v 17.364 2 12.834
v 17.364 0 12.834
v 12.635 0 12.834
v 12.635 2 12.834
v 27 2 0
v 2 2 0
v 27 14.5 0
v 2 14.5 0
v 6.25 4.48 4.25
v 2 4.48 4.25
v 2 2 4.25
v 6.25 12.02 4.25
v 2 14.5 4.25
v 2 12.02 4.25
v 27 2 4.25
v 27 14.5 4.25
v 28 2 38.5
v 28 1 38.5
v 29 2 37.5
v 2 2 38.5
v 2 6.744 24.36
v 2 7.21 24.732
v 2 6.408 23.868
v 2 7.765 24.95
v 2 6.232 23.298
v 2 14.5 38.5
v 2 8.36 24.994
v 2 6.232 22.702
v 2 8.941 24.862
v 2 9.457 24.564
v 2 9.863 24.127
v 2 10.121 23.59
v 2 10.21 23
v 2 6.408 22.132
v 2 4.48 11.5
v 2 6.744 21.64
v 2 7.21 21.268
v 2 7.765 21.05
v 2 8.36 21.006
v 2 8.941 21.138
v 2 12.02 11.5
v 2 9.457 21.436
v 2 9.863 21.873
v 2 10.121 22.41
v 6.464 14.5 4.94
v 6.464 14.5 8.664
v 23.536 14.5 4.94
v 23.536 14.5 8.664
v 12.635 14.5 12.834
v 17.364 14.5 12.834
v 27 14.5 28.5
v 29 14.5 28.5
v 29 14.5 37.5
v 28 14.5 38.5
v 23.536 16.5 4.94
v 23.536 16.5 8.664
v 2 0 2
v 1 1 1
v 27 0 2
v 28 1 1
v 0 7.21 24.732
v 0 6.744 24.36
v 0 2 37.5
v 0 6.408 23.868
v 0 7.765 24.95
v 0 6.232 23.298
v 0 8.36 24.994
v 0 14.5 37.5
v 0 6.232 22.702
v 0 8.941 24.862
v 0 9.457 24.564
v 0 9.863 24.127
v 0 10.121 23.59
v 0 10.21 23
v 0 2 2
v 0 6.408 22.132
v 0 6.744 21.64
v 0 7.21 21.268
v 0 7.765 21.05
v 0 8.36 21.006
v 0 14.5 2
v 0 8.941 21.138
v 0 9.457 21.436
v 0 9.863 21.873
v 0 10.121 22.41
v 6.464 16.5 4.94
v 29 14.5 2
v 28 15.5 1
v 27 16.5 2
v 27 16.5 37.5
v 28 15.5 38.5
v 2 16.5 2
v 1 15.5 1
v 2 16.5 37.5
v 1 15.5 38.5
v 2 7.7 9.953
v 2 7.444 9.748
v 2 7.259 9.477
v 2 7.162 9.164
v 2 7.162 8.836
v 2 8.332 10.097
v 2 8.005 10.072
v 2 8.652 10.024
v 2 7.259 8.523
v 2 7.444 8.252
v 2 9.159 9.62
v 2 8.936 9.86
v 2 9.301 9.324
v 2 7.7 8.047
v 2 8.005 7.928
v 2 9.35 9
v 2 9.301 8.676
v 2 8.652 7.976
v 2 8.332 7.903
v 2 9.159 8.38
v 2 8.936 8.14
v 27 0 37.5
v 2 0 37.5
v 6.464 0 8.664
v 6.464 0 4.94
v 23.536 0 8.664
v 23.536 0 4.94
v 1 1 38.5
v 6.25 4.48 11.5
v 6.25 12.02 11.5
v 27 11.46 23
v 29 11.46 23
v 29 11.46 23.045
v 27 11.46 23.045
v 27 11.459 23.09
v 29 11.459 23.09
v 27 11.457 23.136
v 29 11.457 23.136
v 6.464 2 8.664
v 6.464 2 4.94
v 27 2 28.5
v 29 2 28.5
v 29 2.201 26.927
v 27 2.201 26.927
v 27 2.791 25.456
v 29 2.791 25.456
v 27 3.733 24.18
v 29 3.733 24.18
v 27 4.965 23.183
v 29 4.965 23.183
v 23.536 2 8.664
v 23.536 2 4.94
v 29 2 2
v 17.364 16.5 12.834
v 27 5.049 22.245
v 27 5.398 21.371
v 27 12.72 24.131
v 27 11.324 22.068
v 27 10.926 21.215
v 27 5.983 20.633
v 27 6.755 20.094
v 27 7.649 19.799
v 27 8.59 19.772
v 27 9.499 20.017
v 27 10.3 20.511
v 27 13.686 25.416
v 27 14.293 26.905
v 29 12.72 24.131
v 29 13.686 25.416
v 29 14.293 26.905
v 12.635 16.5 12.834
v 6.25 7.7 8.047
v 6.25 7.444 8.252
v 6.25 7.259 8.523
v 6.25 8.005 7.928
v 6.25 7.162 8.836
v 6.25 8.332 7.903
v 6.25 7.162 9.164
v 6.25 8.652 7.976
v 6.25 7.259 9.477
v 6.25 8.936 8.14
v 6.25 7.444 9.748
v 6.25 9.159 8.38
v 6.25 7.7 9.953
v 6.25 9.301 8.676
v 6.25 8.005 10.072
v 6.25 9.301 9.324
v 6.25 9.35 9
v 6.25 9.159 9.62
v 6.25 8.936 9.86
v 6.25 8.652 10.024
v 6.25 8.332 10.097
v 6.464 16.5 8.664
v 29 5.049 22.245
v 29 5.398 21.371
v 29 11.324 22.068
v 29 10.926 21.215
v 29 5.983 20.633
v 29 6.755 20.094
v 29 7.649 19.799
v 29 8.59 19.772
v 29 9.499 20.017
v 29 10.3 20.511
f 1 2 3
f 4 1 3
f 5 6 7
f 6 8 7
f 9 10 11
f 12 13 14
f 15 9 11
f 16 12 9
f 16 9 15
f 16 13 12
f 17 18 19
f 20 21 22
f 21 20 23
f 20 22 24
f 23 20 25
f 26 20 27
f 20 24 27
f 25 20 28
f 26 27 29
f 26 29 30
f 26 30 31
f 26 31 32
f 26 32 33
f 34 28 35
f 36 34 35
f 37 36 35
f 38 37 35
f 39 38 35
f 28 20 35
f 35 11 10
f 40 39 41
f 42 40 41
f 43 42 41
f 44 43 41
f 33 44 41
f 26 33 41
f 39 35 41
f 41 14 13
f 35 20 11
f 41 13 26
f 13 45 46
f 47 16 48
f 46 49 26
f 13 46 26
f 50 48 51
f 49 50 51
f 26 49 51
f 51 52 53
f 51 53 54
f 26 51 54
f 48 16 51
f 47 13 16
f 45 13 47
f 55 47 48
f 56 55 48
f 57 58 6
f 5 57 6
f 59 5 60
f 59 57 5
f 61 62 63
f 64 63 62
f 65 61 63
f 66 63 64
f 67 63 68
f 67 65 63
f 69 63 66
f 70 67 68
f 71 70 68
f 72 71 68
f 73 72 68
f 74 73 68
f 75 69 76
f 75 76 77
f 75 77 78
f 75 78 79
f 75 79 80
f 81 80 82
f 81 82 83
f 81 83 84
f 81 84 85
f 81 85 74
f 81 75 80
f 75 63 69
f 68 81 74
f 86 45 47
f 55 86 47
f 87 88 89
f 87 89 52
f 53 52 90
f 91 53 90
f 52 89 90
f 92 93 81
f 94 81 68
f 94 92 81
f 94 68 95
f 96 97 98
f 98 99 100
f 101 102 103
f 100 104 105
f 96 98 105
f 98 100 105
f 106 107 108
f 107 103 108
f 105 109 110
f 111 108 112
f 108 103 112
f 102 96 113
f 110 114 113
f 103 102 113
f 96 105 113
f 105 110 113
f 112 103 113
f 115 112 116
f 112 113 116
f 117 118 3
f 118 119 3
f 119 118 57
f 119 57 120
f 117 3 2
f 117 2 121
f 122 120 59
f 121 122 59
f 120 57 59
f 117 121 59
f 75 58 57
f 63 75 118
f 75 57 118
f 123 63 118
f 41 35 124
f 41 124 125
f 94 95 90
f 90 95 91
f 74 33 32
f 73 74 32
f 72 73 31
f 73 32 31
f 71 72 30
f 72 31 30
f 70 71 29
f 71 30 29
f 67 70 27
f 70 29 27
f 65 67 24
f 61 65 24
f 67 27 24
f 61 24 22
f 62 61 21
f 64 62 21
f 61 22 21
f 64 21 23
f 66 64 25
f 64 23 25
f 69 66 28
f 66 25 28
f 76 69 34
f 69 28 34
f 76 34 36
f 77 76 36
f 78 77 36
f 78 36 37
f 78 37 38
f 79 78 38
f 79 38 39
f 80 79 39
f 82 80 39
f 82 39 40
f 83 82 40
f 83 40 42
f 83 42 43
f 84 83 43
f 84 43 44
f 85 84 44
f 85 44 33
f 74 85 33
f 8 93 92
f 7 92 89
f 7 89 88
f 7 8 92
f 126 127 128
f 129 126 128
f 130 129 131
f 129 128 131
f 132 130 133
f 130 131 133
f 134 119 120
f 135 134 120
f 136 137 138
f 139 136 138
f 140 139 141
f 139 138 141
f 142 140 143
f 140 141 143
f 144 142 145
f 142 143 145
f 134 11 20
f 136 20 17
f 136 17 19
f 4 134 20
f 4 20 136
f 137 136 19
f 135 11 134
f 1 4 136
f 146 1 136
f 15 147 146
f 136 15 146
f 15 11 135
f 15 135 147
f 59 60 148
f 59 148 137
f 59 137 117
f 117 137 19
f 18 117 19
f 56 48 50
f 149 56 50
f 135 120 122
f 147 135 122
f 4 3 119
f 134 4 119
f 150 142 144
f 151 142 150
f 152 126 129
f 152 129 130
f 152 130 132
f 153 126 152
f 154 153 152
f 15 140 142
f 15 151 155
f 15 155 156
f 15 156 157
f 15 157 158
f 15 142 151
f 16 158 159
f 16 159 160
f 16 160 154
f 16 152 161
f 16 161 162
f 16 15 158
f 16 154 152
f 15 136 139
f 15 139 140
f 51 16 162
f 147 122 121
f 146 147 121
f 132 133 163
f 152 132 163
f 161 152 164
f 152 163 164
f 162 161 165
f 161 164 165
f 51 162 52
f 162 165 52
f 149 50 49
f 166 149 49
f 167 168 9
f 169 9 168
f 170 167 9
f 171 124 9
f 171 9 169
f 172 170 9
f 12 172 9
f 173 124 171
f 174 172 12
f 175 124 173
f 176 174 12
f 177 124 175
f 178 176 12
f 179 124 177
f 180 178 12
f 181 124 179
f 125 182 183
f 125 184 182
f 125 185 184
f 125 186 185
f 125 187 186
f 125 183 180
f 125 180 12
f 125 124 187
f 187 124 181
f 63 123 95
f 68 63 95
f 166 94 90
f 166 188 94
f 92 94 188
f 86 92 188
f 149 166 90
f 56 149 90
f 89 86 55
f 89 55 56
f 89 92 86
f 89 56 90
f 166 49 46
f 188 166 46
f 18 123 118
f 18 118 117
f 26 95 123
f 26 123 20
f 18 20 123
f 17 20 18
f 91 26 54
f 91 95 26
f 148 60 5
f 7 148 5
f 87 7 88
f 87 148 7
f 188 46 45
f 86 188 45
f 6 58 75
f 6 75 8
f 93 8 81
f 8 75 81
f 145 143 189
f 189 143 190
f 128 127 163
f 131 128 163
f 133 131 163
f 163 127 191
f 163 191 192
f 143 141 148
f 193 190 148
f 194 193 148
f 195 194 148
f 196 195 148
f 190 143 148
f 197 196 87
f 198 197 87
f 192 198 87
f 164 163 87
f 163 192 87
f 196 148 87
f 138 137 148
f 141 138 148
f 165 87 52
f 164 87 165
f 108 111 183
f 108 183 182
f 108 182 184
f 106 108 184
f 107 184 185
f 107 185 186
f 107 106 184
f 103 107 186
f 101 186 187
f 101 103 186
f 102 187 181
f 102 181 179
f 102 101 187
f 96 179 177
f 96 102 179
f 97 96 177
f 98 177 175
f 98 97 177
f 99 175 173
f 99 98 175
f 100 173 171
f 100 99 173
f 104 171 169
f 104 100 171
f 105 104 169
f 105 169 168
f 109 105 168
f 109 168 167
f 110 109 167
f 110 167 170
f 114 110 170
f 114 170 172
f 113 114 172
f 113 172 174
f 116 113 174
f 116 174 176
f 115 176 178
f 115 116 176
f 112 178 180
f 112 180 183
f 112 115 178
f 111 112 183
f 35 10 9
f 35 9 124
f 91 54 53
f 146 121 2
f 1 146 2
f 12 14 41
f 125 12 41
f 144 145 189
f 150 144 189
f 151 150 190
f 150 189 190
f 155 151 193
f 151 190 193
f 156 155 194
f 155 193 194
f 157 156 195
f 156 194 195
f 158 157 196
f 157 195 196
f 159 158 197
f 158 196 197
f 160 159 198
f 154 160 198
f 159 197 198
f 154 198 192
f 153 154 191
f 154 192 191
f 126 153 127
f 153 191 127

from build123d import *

# Parameters (mm, degrees)
F0_W      = 29
F0_H      = 16.5
F1_DEPTH  = 38.5
F2_T      = -2
F3_DEPTH  = 2.25
F4_SIZE   = 2
F5_SIZE   = 2
F6_SIZE   = 0.99999
F8_DEPTH  = 16.501
F10_DEPTH = 2
F11_R     = 2
F12_DEPTH = 2.001
F13_W     = 7.54
F13_H     = 7.25
F13_R     = 1.1
F14_DEPTH = 4.25


# Not quite as in the source:
# - a fillet or chamfer is up to 0.001 mm smaller than in the source, because OpenCascade refuses the exact size


with BuildPart() as f1:
    # F0 (on Top) → F1 (new body)
    with BuildSketch(Plane.XY):
        with Locations((14.5, 8.25)):
            Rectangle(F0_W, F0_H)
    extrude(amount=F1_DEPTH)

    # F2
    f2_openings = [f1.faces().sort_by_distance(p)[0] for p in [
        (14.5, 8.25, 38.5),
    ]]
    offset(amount=F2_T, openings=f2_openings)

    # F3 (add): a face of the model
    f3_faces = [f1.faces().sort_by_distance(p)[0] for p in [
        (14.5, 8.25, 2),
    ]]
    extrude(f3_faces, amount=F3_DEPTH)

    # F4
    f4_edges = [f1.edges().sort_by_distance(p)[0] for p in [
        (0, 0, 19.25),
        (0, 16.5, 19.25),
        (29, 16.5, 19.25),
        (29, 0, 19.25),
    ]]
    chamfer(f4_edges, length=F4_SIZE)

    # F5 (call 1 of 4: OpenCascade refuses the feature's edges together)
    f5_edges = [f1.edges().sort_by_distance(p)[0] for p in [
        (14.5, 16.5, 0),
    ]]
    chamfer(f5_edges, length=F5_SIZE)

    # F5#2 (call 2 of 4)
    f5_2_edges = [f1.edges().sort_by_distance(p)[0] for p in [
        (29, 8.25, 0),
    ]]
    chamfer(f5_2_edges, length=F5_SIZE)

    # F5#3 (call 3 of 4)
    f5_3_edges = [f1.edges().sort_by_distance(p)[0] for p in [
        (14.5, 0, 0),
    ]]
    chamfer(f5_3_edges, length=F5_SIZE)

    # F5#4 (call 4 of 4)
    f5_4_edges = [f1.edges().sort_by_distance(p)[0] for p in [
        (0, 8.25, 0),
    ]]
    chamfer(f5_4_edges, length=F5_SIZE)

    # F6 (size 1 in the source; OpenCascade refuses exactly that, so slightly less here)
    f6_edges = [f1.edges().sort_by_distance(p)[0] for p in [
        (14.5, 16.5, 38.5),
        (0, 8.25, 38.5),
        (14.5, 0, 38.5),
        (29, 8.25, 38.5),
    ]]
    chamfer(f6_edges, length=F6_SIZE)

    # F7 (on face) → F8 (cut, through all)
    with BuildSketch(Plane.XZ):
        Polygon((6.464, 8.664), (6.464, 4.94), (23.536, 4.94), (23.536, 8.664), (17.364, 12.834), (12.635, 12.834), align=None)
    extrude(amount=-F8_DEPTH, mode=Mode.SUBTRACT)

    # F9 (on face) → F10 (cut, through all)
    with BuildSketch(Plane.YZ.offset(29)):
        with BuildLine():
            Line((2, 28.5), (14.5, 28.5))
            ThreePointArc((14.5, 28.5), (8.25, 34.75), (2, 28.5))
        make_face()
        with BuildLine():
            ThreePointArc((11.4572188031, 23.1356503144), (13.6863414867, 25.4163834155), (14.5, 28.5))
            Line((14.5, 28.5), (2, 28.5))
            ThreePointArc((2, 28.5), (2.7914047728, 25.4559503707), (4.9651962066, 23.1828048711))
            ThreePointArc((4.9651962066, 23.1828048711), (8.2336565888, 26.2499142718), (11.4572188031, 23.1356503144))
        make_face()
        with BuildLine():
            ThreePointArc((2, 28.5), (8.25, 34.75), (14.5, 28.5))
            Line((14.5, 28.5), (14.5, 38.5))
            Line((14.5, 38.5), (2, 38.5))
            Line((2, 38.5), (2, 28.5))
        make_face()
        with BuildLine():
            ThreePointArc((11.4600509613, 23), (11.4593428446, 23.0678399383), (11.4572188031, 23.1356503144))
            ThreePointArc((11.4572188031, 23.1356503144), (8.2046045626, 22.2501648618), (4.9651962066, 23.1828048711))
            ThreePointArc((4.9651962066, 23.1828048711), (8.1186123283, 19.751286566), (11.4600509613, 23))
        make_face()
        with BuildLine():
            ThreePointArc((4.9651962066, 23.1828048711), (8.2046045626, 22.2501648618), (11.4572188031, 23.1356503144))
            ThreePointArc((11.4572188031, 23.1356503144), (8.2336565888, 26.2499142718), (4.9651962066, 23.1828048711))
        make_face()
    extrude(amount=-F10_DEPTH, mode=Mode.SUBTRACT)

    # F11 (on face) → F12 (cut, through all)
    with BuildSketch(Plane.YZ.offset(2)):
        with Locations((8.2100509613, 23)):
            Circle(F11_R)
    extrude(amount=-F12_DEPTH, mode=Mode.SUBTRACT)

    # F13 (on face) → F14 (join)
    with BuildSketch(Plane.YZ.offset(2)):
        with Locations((8.25, 7.875)):
            Rectangle(F13_W, F13_H)
        with Locations((8.25, 9)):
            Circle(F13_R, mode=Mode.SUBTRACT)
    extrude(amount=F14_DEPTH)


solid = f1.part
